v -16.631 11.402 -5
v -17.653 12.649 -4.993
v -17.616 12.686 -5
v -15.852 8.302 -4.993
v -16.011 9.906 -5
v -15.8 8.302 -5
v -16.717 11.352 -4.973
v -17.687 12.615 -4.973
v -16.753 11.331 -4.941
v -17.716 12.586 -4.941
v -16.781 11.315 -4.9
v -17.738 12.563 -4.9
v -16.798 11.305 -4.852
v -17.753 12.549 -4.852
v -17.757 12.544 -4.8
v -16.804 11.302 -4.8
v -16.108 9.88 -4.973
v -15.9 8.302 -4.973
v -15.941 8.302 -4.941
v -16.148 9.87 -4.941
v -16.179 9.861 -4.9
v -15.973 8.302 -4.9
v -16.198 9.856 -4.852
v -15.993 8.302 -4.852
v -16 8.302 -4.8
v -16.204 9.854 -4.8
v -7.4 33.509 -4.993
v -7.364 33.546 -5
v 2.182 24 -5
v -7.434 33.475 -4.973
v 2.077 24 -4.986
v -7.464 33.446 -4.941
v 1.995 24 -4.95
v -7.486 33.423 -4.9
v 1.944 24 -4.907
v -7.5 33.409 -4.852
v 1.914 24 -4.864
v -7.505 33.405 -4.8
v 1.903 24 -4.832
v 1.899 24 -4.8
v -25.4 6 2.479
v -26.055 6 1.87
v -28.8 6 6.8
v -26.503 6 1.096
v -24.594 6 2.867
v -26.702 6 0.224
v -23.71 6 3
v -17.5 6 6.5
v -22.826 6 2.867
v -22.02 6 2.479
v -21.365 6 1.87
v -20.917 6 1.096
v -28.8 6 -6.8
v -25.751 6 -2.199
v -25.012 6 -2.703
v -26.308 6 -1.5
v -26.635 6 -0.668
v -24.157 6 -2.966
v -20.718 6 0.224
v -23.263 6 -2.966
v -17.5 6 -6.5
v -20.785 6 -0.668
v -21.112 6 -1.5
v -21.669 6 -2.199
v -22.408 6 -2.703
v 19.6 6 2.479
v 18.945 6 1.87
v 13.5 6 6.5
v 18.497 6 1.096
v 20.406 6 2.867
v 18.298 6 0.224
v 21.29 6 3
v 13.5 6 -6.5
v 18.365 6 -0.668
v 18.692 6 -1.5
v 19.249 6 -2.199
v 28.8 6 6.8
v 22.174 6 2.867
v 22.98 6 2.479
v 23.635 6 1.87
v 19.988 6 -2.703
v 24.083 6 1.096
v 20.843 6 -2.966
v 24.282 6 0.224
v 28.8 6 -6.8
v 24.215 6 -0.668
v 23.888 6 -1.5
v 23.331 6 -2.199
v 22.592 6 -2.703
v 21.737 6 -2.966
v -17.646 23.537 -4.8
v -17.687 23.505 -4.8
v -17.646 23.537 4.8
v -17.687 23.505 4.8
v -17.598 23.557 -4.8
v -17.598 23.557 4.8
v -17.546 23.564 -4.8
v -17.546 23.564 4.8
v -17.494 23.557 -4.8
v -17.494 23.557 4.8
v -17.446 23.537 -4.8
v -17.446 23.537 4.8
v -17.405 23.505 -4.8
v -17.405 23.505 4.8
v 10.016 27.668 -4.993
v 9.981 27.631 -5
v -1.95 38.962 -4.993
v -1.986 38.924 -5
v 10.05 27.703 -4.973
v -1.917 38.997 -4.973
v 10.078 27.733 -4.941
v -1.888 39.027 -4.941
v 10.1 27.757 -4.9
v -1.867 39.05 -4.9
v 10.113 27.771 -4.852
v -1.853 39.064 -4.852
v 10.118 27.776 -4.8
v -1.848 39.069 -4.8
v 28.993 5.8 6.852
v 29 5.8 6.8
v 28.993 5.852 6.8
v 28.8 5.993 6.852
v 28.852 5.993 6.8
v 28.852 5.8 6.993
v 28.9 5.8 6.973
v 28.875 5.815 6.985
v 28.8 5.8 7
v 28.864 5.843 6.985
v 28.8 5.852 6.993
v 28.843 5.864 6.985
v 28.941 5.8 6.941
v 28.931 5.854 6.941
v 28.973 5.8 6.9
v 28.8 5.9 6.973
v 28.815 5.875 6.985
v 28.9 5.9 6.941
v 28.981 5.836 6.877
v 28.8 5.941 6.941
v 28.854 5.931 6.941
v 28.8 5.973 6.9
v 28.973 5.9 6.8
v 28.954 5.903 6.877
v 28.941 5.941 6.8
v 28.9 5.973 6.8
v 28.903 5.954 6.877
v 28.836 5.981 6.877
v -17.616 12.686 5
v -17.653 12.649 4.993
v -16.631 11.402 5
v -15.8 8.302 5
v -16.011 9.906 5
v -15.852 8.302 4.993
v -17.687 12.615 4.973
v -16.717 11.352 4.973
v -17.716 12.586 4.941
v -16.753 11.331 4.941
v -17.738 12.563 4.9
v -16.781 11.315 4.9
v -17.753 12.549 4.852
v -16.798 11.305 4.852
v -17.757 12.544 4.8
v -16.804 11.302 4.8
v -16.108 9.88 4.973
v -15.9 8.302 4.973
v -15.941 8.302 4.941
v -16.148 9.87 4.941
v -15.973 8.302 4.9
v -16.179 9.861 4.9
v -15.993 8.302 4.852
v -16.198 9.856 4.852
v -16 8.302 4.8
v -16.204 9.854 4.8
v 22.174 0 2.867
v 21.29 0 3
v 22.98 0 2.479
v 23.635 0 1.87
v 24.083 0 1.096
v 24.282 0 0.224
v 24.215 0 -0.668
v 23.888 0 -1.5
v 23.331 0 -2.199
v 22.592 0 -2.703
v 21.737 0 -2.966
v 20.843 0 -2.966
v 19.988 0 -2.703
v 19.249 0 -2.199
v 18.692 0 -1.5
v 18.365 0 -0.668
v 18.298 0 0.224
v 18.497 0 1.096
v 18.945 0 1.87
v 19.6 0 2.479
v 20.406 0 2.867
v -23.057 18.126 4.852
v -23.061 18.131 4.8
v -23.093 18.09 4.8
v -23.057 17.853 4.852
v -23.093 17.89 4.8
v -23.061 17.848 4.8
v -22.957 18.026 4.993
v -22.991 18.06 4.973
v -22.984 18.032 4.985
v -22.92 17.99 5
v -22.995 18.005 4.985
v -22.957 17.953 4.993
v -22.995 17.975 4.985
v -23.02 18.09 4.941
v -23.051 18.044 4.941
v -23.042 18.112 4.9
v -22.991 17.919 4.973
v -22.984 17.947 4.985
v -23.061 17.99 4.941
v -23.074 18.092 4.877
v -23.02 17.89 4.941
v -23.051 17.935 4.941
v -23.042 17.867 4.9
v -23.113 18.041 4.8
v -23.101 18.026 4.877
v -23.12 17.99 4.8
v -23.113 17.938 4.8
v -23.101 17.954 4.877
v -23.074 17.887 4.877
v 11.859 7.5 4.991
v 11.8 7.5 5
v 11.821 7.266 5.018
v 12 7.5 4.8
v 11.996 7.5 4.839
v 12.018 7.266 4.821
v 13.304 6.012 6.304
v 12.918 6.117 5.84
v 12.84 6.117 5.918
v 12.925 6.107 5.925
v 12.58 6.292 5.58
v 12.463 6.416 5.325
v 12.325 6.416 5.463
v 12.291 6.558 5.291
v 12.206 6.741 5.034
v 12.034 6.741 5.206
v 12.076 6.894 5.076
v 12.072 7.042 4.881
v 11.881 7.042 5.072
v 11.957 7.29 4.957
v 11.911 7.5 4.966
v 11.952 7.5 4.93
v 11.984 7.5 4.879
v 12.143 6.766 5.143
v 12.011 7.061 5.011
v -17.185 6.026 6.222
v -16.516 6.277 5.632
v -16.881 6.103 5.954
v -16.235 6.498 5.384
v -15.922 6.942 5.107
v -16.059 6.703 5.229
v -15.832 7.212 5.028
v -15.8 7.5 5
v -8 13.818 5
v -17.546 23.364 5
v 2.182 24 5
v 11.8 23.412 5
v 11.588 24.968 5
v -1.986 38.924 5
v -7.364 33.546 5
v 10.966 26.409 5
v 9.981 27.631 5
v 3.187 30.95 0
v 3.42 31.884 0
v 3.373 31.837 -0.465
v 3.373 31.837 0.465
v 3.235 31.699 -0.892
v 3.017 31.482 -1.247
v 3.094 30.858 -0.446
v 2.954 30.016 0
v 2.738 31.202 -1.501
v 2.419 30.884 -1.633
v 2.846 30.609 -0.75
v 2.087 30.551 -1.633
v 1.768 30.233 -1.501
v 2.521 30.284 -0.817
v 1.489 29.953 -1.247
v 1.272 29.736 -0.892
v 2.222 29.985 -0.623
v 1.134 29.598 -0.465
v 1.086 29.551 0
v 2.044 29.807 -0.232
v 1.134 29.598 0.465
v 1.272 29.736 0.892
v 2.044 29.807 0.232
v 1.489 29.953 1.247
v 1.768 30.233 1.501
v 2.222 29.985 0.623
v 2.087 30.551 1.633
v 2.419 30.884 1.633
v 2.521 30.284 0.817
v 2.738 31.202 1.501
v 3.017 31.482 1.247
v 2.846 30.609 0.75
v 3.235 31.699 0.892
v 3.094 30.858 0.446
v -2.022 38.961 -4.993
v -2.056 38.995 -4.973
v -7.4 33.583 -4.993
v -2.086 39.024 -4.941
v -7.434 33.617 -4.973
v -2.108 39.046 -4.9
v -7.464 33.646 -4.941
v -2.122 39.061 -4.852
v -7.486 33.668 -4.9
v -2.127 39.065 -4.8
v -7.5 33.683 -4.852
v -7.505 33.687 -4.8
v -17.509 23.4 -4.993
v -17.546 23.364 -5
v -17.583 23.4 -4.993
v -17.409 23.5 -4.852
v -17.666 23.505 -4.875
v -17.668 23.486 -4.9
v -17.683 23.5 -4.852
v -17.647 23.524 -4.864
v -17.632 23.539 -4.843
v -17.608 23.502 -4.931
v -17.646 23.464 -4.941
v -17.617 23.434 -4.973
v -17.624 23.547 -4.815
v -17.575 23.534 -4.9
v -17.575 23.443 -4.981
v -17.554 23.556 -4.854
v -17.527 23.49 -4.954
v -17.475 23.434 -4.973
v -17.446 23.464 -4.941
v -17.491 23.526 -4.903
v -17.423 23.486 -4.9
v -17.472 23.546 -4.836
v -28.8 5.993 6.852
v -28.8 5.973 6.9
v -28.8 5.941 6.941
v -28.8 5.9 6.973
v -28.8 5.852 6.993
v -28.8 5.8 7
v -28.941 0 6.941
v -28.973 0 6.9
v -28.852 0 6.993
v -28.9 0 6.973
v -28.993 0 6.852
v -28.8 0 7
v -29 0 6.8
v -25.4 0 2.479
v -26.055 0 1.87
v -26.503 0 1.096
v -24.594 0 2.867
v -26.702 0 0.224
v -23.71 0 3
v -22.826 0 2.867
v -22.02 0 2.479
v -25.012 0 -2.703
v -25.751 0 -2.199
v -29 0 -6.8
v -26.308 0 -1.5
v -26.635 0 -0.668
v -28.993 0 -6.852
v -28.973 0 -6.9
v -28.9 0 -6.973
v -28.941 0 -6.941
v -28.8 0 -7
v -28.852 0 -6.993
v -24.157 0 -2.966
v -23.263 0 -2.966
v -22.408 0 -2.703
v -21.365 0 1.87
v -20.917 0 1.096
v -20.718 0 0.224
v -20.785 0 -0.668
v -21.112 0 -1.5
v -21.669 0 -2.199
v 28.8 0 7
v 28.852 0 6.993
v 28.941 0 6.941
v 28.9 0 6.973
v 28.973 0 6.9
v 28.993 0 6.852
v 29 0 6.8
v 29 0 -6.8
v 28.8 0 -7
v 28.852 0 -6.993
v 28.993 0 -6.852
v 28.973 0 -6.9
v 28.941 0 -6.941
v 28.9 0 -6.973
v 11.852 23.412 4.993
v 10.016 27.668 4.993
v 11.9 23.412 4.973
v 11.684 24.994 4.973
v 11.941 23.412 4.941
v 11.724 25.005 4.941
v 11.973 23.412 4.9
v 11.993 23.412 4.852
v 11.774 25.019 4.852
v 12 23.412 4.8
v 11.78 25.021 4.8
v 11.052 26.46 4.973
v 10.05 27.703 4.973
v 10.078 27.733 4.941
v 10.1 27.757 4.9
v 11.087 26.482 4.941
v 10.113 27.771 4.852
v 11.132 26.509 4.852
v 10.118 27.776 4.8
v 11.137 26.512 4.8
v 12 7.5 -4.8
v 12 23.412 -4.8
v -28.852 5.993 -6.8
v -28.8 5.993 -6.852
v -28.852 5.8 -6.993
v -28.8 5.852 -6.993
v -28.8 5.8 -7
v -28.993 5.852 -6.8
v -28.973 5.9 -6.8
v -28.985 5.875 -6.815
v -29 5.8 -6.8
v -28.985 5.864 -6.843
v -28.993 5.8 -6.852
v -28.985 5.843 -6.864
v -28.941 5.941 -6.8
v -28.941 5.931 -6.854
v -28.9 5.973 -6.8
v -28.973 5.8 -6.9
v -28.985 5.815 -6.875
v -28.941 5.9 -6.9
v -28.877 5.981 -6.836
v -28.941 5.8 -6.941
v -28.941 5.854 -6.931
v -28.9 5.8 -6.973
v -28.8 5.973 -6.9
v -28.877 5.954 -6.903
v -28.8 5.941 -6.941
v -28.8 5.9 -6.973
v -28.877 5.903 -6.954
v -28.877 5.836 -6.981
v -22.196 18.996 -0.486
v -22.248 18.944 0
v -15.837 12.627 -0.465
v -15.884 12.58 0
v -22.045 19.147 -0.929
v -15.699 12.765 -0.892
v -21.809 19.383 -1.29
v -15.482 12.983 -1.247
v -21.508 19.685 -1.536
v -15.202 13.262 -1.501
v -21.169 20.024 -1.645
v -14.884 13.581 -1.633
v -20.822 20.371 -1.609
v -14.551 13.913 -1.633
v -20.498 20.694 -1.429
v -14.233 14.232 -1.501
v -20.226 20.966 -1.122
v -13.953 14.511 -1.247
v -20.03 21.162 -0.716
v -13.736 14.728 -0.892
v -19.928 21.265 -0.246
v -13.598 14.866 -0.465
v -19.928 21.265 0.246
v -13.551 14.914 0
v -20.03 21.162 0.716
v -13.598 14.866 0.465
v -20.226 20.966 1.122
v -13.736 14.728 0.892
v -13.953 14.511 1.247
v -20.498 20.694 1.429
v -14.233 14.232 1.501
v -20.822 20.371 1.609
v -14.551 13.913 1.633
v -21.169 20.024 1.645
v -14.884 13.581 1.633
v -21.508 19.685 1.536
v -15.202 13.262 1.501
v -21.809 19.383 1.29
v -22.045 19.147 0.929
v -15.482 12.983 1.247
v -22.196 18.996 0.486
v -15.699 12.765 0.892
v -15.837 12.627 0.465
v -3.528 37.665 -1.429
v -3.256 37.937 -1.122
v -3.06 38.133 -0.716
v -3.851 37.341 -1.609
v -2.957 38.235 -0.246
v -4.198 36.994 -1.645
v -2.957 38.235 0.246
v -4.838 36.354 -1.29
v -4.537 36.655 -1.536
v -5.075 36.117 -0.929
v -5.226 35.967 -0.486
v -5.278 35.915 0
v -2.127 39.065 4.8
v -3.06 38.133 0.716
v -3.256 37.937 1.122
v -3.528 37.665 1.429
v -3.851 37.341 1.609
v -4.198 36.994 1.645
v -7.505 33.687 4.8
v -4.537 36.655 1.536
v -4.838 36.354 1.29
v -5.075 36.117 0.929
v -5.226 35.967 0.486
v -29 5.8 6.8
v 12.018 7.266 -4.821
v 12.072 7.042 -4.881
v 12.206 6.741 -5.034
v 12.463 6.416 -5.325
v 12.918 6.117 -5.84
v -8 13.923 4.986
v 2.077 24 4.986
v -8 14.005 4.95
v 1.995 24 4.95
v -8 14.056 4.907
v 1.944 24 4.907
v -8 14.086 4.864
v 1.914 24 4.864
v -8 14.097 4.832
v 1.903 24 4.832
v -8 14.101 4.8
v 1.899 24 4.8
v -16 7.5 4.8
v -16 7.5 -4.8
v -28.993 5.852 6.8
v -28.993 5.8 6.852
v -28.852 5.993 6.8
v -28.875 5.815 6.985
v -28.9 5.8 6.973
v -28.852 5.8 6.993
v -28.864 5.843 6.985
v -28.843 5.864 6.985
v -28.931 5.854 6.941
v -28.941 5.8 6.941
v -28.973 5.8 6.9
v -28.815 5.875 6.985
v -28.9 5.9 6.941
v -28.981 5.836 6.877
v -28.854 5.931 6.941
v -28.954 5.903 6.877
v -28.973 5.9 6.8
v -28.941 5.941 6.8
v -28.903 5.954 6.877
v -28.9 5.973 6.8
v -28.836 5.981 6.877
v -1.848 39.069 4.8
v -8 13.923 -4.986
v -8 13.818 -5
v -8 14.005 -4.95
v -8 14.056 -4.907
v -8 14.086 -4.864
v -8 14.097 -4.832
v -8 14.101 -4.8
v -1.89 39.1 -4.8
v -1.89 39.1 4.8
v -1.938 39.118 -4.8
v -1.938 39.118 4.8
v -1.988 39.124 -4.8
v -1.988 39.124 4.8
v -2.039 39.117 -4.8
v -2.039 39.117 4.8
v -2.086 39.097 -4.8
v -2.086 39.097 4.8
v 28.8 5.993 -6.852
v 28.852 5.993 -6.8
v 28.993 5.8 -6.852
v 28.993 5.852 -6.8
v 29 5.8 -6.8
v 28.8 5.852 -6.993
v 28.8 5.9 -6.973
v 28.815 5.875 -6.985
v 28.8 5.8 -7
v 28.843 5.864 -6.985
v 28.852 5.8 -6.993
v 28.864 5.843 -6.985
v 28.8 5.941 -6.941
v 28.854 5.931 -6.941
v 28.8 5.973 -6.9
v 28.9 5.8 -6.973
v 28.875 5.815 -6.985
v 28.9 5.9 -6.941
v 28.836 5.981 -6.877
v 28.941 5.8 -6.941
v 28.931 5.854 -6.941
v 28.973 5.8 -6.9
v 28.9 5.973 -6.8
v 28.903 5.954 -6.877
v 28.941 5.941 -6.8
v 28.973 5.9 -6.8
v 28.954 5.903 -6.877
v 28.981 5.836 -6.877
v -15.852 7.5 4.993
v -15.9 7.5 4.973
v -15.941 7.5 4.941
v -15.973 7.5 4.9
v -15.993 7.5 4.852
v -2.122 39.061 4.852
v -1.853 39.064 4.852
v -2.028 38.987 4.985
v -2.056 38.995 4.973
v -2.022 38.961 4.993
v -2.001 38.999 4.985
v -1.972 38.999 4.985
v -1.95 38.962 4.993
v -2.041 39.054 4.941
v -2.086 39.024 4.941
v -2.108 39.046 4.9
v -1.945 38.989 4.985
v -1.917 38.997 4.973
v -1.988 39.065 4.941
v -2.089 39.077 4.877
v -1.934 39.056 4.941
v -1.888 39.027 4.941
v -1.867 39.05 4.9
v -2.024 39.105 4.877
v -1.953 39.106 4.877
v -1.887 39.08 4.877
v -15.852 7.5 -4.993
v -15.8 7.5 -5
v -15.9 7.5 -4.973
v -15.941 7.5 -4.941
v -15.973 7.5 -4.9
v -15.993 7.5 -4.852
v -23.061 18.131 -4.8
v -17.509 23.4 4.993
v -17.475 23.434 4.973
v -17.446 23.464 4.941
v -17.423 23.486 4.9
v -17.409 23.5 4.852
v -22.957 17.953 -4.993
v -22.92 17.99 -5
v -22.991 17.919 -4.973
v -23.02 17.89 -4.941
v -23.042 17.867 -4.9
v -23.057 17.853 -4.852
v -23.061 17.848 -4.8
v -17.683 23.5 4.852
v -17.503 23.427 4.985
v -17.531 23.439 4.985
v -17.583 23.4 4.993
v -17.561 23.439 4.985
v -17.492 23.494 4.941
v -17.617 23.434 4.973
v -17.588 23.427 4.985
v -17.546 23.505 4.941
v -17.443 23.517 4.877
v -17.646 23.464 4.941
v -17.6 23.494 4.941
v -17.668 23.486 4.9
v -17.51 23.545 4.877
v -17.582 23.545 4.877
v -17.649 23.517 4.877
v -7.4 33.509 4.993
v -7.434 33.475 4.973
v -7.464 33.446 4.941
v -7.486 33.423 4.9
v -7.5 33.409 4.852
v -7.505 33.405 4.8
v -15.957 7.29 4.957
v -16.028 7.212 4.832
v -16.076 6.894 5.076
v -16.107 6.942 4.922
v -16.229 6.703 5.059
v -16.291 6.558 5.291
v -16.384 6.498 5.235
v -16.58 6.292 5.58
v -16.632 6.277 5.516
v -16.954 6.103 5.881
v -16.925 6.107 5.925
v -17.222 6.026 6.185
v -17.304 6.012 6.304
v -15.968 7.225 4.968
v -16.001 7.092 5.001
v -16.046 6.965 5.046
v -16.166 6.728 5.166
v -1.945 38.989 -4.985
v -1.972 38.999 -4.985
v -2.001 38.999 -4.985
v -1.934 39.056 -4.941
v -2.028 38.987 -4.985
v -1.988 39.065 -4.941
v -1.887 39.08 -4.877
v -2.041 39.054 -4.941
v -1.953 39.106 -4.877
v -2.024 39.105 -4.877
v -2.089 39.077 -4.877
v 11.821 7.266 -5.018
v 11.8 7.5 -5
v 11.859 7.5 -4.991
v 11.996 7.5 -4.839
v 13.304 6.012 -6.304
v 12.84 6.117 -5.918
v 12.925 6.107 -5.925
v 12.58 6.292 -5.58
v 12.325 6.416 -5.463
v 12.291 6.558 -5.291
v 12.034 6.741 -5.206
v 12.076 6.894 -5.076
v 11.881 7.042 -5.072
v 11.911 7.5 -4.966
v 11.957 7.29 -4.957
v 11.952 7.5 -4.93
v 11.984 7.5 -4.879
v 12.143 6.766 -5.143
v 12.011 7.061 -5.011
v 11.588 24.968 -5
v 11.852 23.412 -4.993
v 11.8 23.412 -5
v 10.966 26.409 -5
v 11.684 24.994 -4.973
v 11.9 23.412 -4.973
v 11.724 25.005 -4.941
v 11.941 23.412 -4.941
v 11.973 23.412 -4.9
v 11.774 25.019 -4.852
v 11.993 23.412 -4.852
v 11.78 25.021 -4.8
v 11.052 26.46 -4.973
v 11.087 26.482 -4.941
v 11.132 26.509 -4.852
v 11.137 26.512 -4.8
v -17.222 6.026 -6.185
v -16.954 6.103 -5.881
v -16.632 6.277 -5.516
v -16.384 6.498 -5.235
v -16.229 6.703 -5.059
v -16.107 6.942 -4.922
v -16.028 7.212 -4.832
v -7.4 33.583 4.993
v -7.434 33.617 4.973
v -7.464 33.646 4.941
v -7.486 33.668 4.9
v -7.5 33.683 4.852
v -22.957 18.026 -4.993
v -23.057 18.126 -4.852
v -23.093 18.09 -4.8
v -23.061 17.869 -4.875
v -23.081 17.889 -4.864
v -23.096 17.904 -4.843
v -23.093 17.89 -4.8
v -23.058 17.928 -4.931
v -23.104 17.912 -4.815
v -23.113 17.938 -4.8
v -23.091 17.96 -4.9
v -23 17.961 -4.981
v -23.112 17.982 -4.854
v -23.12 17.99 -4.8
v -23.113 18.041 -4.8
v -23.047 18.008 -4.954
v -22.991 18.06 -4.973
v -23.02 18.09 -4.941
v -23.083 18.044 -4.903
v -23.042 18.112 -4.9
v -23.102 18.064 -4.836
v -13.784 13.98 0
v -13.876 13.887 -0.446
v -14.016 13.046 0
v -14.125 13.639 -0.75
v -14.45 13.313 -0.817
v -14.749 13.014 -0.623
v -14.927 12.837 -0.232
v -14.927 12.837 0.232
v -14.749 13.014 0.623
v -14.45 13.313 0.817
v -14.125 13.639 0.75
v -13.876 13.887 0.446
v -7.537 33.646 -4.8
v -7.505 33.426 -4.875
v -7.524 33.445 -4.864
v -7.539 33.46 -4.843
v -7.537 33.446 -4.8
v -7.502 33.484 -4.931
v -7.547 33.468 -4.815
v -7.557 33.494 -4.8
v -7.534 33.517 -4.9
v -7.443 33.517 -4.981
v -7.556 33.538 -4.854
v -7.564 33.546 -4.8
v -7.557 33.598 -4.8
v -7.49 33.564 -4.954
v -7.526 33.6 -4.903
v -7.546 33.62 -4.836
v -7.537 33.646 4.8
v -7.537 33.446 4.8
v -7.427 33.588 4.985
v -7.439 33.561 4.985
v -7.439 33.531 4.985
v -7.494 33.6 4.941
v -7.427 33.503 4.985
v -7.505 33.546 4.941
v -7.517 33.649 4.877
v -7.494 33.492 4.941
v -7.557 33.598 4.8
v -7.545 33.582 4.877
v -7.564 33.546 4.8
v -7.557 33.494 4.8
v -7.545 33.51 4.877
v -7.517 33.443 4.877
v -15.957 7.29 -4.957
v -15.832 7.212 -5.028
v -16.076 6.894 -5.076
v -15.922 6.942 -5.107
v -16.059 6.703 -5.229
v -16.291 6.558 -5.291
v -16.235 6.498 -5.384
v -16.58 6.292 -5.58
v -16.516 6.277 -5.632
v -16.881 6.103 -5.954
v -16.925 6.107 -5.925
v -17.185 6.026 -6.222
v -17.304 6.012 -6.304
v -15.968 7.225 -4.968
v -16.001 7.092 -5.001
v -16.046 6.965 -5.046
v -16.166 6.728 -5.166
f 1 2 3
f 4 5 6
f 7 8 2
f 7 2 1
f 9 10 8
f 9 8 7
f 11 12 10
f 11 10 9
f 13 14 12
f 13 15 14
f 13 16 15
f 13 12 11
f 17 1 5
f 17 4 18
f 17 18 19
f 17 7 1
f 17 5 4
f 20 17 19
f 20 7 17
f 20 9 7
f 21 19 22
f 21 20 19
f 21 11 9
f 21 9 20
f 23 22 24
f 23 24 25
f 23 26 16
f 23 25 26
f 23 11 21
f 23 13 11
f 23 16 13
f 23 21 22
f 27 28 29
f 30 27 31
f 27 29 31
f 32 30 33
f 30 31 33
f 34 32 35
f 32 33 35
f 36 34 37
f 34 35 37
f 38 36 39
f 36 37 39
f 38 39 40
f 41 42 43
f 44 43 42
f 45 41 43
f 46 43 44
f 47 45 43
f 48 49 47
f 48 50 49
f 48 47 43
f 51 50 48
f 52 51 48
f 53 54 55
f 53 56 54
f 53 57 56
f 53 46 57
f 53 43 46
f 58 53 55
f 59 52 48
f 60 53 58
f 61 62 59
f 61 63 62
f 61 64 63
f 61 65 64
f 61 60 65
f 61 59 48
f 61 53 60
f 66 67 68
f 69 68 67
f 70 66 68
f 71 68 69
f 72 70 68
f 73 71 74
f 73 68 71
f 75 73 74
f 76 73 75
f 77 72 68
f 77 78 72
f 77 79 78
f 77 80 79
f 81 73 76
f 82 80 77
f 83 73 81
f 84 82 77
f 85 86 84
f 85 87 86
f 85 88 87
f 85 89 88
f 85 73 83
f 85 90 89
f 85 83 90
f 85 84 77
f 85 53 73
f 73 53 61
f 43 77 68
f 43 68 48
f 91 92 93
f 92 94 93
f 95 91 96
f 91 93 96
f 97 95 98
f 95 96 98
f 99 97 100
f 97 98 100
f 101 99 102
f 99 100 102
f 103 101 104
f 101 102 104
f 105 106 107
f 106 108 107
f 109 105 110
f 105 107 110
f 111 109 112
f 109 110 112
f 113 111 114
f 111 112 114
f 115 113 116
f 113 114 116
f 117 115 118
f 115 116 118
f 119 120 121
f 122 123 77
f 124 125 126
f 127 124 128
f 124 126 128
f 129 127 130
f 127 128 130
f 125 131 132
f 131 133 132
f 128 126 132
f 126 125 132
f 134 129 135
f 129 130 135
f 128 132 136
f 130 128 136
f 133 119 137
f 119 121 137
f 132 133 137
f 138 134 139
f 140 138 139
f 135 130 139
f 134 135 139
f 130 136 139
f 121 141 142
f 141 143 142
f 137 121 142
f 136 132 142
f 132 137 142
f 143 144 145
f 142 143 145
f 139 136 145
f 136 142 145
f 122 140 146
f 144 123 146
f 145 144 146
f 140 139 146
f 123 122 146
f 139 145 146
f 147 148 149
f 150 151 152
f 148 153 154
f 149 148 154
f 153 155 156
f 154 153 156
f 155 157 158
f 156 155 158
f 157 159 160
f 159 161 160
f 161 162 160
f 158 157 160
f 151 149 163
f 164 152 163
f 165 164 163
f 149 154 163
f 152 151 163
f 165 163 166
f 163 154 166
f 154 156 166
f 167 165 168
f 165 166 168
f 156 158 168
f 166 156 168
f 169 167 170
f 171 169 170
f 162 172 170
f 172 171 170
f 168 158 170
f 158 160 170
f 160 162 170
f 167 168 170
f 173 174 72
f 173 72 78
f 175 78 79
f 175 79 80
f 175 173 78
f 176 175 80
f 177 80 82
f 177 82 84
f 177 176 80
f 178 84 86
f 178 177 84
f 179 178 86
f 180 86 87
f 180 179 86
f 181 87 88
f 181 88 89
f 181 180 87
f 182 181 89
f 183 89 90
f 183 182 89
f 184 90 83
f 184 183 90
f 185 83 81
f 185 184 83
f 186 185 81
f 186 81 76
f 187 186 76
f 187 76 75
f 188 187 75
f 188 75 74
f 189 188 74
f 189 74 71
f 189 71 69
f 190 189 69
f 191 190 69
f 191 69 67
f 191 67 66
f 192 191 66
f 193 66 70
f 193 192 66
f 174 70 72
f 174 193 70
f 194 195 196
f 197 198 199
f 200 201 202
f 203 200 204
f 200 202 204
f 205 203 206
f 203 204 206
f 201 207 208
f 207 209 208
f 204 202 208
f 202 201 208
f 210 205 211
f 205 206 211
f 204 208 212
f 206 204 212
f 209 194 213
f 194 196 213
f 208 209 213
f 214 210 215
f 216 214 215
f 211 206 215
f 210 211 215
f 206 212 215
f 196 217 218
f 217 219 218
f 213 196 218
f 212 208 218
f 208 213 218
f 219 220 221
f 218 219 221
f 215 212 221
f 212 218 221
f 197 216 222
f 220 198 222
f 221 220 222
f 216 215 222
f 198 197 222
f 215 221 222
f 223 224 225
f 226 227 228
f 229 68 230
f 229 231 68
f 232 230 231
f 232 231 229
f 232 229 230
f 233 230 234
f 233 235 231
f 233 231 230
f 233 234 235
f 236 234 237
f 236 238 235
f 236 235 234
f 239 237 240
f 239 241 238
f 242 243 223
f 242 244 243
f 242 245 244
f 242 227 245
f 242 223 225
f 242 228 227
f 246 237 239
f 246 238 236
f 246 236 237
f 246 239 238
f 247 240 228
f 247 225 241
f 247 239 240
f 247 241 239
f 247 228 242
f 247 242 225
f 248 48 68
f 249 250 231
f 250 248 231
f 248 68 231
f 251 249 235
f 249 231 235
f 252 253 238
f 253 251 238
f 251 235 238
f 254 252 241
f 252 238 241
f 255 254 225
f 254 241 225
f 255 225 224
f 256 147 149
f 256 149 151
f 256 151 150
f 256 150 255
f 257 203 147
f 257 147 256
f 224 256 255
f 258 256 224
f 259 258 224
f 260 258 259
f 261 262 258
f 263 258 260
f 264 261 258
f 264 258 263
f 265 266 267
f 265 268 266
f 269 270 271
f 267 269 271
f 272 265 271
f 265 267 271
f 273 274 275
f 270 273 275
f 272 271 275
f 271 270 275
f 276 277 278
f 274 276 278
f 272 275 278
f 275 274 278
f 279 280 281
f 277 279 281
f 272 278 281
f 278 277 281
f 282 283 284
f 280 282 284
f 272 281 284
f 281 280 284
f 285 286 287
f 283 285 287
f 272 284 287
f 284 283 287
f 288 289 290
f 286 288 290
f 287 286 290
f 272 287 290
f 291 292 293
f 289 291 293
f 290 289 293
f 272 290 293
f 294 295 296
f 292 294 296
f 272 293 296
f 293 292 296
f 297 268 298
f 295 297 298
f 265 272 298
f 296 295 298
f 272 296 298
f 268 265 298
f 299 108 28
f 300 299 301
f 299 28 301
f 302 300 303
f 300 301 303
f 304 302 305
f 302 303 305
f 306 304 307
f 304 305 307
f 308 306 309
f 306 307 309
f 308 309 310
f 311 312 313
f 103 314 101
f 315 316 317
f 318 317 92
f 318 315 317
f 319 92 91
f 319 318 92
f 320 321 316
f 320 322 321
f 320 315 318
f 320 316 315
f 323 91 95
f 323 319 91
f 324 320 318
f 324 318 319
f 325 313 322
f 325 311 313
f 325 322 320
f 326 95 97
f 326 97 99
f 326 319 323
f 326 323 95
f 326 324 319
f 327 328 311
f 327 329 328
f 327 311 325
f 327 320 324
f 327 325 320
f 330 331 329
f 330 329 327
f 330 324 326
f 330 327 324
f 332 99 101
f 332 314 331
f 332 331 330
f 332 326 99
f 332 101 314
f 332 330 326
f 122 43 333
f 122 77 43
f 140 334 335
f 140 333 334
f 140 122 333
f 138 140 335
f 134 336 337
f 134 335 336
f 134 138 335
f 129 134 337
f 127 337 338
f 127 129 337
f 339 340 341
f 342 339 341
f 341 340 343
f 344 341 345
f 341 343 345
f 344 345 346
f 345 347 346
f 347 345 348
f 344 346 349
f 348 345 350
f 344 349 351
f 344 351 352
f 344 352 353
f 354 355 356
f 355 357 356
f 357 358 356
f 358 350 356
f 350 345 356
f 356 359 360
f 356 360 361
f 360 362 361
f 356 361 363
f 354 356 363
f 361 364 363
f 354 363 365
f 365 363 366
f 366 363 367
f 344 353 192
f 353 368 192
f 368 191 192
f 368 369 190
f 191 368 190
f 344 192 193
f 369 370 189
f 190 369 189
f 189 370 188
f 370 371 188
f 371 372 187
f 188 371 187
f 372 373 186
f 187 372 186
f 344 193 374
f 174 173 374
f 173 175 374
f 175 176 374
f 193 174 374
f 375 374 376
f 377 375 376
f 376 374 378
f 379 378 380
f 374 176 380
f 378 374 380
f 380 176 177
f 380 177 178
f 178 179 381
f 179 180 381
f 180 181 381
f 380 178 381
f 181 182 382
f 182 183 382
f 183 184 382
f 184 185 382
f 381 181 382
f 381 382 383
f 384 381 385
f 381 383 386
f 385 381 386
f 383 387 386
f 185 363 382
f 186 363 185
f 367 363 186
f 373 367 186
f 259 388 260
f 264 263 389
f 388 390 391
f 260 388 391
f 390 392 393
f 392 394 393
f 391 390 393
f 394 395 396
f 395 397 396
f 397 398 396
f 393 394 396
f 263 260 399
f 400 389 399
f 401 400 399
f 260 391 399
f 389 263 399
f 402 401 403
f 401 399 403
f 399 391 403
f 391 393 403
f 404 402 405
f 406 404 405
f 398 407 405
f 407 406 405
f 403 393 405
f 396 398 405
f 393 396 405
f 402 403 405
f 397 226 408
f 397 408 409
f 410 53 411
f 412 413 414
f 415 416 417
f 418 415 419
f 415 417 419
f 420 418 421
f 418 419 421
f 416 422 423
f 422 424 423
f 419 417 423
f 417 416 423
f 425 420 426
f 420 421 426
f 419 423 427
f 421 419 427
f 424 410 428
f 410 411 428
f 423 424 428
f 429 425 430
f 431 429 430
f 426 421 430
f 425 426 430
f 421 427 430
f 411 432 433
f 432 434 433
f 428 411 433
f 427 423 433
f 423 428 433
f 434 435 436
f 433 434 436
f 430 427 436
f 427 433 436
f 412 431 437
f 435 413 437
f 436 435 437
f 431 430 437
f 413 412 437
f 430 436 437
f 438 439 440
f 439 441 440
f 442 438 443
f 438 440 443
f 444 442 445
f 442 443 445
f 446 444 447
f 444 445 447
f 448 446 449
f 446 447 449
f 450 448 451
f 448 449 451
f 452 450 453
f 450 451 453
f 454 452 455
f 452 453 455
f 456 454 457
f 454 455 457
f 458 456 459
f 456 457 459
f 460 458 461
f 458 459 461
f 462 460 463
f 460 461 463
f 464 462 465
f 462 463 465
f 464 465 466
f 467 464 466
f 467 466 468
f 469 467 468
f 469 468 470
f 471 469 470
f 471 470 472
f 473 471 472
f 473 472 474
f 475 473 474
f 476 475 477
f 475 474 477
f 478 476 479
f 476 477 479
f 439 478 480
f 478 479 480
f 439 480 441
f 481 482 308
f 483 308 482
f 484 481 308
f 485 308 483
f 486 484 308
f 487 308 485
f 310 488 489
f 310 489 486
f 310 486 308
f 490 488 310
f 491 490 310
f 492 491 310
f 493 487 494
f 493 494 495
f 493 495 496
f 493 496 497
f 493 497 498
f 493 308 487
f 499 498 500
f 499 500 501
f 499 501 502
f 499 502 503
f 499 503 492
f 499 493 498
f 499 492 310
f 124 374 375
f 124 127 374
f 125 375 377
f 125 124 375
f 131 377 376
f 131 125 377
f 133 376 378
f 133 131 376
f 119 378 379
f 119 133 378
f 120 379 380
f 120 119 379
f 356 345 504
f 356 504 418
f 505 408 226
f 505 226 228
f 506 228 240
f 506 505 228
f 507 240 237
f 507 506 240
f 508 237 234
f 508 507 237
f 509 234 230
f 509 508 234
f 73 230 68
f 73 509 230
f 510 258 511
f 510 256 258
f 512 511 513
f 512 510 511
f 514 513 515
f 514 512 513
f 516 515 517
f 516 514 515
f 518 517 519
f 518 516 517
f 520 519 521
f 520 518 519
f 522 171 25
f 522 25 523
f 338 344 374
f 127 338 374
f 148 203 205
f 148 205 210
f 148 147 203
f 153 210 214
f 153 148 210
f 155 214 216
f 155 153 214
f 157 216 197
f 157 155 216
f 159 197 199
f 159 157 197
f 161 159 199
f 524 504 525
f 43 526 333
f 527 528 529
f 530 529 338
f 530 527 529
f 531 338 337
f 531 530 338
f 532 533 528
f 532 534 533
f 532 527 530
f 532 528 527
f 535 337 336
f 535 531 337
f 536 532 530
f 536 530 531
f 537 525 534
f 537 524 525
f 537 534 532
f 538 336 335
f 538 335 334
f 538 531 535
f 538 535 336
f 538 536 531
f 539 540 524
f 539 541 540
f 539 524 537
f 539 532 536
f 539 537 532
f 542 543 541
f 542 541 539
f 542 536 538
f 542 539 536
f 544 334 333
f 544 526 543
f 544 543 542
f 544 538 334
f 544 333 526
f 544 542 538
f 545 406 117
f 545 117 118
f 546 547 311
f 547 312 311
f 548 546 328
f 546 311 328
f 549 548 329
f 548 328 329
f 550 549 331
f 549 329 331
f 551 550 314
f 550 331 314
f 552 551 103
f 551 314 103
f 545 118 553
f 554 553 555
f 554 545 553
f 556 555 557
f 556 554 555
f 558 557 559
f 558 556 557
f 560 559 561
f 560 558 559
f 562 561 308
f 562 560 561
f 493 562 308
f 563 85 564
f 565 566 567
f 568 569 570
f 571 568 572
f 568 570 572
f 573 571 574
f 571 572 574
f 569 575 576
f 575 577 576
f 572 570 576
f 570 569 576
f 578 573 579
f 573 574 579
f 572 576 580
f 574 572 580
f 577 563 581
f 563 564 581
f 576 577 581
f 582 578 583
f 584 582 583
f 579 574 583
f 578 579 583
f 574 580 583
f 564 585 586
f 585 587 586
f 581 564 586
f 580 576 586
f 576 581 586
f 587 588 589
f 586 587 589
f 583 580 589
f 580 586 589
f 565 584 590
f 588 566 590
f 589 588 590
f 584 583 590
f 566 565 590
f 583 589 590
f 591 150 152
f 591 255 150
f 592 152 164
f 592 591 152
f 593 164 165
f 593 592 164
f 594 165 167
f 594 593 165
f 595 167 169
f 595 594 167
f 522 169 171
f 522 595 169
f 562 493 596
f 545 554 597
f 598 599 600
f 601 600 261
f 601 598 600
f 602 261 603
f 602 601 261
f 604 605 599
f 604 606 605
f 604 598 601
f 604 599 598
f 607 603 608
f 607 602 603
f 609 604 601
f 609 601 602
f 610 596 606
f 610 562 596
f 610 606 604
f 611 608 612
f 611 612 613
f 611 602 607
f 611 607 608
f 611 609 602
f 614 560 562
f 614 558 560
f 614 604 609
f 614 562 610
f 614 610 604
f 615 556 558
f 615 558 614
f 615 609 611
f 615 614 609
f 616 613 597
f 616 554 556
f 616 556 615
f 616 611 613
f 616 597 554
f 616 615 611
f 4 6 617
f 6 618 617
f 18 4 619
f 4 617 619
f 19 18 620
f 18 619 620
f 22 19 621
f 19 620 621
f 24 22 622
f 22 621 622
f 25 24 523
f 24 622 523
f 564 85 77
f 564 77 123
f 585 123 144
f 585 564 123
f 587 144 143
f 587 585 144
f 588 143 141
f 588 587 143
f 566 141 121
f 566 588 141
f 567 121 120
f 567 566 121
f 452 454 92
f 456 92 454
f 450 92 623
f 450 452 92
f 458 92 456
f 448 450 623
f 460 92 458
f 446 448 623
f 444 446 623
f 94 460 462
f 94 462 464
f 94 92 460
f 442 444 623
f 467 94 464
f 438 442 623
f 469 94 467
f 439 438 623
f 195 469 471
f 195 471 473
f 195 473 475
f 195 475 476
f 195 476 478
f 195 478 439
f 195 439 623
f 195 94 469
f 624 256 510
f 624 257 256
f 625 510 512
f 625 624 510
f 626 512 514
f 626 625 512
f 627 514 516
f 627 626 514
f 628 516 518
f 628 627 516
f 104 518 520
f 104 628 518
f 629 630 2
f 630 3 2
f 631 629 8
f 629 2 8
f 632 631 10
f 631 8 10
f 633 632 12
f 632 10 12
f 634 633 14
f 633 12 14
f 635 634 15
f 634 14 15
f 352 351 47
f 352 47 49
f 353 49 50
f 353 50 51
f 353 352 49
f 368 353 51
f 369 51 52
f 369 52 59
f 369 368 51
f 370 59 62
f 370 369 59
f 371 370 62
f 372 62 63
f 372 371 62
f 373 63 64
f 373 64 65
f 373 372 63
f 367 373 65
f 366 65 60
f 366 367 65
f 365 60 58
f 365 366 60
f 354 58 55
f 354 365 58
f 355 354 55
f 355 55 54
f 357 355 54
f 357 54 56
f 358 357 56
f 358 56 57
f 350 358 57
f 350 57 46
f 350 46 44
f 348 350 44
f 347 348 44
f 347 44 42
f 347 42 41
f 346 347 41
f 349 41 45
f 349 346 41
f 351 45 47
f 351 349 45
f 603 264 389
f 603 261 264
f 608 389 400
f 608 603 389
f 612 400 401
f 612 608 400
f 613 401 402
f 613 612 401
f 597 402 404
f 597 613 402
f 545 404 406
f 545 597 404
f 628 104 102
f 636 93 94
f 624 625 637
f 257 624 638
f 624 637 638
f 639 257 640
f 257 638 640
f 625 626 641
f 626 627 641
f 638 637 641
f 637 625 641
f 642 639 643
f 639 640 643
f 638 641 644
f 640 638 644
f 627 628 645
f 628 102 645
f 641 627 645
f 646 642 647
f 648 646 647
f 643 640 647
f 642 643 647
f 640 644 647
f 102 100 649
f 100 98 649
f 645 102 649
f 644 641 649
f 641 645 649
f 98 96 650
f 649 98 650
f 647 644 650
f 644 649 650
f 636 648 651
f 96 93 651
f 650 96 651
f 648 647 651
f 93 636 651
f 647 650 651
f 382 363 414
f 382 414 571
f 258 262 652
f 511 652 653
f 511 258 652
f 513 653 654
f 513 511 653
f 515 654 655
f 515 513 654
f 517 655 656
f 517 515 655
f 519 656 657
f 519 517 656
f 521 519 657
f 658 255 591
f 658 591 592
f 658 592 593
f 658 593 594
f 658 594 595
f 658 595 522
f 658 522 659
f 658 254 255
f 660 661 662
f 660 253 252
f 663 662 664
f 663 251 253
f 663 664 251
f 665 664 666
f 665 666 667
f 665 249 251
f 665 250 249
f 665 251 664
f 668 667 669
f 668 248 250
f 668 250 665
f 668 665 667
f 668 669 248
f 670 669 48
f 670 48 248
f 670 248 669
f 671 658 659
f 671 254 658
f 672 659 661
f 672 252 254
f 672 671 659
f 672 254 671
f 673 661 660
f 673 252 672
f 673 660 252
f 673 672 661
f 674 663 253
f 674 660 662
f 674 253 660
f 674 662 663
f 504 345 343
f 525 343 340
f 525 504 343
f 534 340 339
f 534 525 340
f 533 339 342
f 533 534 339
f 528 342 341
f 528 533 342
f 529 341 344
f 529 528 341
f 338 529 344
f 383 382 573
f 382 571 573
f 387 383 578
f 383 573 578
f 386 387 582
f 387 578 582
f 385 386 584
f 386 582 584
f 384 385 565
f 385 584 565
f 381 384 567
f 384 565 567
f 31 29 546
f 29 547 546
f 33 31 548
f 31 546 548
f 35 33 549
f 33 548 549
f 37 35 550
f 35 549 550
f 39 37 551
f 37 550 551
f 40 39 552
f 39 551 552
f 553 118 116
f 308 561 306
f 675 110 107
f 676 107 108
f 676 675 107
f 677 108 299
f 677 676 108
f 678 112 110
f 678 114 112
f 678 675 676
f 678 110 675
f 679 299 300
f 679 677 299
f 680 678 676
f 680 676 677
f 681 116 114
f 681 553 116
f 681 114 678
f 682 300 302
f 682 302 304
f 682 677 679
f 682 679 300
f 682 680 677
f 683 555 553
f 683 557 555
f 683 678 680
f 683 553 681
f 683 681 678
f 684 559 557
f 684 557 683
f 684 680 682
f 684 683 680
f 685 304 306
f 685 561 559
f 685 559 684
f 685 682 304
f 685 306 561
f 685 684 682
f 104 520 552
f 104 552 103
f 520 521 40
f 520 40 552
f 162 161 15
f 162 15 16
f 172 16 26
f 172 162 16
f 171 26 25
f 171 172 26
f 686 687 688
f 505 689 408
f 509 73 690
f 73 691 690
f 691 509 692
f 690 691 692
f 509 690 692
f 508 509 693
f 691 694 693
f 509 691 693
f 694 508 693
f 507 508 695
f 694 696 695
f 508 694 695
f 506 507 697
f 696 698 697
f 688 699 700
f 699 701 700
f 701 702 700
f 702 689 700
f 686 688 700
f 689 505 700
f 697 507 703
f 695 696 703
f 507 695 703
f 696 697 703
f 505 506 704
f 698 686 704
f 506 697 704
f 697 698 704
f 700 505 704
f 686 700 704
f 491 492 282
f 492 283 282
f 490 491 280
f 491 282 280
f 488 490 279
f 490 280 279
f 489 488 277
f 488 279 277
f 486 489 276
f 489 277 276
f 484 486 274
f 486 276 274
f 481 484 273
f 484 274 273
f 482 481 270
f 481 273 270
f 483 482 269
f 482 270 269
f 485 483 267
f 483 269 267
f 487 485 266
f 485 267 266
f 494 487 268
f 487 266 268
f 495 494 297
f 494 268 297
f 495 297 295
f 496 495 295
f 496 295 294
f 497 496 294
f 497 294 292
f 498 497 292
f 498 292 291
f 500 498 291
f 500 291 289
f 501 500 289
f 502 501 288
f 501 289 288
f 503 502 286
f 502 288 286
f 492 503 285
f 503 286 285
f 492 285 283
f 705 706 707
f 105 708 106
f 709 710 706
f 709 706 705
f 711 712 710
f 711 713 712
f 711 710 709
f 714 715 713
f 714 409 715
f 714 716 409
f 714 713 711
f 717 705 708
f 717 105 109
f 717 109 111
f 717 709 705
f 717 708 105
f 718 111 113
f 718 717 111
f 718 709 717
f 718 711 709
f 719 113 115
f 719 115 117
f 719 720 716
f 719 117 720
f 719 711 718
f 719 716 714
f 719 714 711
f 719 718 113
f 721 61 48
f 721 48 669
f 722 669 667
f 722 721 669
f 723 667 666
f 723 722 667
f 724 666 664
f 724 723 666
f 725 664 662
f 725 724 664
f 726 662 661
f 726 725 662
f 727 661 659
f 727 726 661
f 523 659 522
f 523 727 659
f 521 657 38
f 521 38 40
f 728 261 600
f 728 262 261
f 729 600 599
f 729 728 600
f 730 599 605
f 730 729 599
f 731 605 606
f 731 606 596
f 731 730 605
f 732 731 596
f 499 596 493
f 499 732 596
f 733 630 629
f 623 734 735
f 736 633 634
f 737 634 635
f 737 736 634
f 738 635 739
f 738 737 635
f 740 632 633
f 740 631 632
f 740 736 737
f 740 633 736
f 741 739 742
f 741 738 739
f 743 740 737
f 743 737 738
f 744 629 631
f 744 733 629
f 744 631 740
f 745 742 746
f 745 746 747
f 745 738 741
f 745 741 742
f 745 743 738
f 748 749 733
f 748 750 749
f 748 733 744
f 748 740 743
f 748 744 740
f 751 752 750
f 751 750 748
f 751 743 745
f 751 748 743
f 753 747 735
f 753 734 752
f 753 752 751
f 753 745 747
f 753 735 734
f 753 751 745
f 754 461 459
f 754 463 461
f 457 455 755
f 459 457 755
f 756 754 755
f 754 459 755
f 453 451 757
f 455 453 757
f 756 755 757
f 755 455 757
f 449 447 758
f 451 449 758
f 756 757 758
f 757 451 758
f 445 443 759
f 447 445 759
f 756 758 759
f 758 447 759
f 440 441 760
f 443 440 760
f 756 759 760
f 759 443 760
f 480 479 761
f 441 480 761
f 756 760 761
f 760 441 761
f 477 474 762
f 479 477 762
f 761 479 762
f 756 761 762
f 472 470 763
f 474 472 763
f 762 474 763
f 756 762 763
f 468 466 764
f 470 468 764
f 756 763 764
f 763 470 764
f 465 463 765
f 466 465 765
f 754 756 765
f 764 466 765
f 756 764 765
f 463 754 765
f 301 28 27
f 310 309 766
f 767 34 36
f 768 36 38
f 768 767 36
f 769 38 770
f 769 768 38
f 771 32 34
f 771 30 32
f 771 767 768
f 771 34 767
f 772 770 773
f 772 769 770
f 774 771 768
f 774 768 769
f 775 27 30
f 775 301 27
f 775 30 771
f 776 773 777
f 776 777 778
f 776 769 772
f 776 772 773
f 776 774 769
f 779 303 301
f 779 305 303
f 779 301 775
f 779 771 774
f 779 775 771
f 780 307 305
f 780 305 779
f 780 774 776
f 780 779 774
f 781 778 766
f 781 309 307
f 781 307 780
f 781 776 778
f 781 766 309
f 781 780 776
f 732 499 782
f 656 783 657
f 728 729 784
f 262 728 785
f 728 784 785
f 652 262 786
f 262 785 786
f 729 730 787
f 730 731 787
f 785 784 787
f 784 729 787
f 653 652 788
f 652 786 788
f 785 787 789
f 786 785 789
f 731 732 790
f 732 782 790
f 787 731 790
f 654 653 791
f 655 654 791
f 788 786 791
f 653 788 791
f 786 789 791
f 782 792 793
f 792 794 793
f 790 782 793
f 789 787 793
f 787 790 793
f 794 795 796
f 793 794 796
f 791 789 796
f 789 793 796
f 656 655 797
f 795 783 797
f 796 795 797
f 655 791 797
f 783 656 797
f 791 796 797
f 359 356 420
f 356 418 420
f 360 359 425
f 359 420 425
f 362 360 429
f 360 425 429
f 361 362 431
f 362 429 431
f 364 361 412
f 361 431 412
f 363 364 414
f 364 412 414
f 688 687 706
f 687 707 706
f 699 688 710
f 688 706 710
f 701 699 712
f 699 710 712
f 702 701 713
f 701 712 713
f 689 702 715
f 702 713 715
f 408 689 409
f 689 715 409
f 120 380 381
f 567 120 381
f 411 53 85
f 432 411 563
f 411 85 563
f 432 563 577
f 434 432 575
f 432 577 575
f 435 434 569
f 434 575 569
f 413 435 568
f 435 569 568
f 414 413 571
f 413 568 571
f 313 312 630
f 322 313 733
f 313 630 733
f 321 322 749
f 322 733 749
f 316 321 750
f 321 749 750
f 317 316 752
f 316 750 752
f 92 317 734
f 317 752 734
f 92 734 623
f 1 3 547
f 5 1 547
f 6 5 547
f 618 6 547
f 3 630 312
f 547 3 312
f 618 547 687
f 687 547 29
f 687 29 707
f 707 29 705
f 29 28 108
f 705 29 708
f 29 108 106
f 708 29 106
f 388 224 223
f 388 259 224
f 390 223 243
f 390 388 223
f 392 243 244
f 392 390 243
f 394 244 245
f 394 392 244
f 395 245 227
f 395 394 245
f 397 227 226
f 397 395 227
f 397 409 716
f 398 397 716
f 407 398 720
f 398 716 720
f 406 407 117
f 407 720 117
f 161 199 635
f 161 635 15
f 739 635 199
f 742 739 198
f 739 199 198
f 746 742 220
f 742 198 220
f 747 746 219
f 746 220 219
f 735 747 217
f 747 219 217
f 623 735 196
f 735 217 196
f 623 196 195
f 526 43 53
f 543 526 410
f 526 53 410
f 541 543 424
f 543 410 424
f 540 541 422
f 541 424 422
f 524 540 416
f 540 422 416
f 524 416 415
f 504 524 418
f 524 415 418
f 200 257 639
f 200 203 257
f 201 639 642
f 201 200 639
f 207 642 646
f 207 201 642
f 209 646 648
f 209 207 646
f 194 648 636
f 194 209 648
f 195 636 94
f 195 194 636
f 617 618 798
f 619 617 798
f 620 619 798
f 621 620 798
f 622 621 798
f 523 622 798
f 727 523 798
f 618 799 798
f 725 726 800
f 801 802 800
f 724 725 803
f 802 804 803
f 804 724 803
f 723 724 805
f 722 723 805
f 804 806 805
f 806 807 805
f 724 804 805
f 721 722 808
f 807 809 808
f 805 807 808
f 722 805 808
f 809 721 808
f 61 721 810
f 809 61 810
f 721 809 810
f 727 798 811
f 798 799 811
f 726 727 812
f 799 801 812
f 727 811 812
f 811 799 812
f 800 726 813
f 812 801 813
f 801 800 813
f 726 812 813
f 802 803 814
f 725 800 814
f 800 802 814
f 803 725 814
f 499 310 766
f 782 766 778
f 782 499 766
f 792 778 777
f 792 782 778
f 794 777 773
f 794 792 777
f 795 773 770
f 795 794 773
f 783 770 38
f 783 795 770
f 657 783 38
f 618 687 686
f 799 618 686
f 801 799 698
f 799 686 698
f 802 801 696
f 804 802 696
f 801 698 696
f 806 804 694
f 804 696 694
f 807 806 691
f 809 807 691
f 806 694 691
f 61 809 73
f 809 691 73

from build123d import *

# Parameters (mm, degrees)
SKETCH1_W                 = 58
SKETCH1_H                 = 14
SKETCH1_R                 = 3
BOSS_EXTRUDE1_DEPTH       = 6
BOSS_EXTRUDE2_DEPTH       = 5
M4X0_7_TAPPED_HOLE1_D     = 3.3
M4X0_7_TAPPED_HOLE1_DEPTH = 9
M4X0_7_TAPPED_HOLE1_TIP   = 0.991420021
FILLET1_R                 = 6
FILLET2_R                 = 1.5
FILLET3_R                 = 0.2


with BuildPart() as part:
    # Sketch1 → Boss-Extrude1 (new body)
    with BuildSketch(Plane(origin=(0, 0, 0), x_dir=(1, 0, 0), z_dir=(0, 1, 0))):
        Rectangle(SKETCH1_W, SKETCH1_H)
        with Locations(Location((-23.71, 0, 0), (0, 0, 270))):
            Circle(SKETCH1_R, mode=Mode.SUBTRACT)
        with Locations(Location((21.29, 0, 0), (0, 0, 270))):
            Circle(SKETCH1_R, mode=Mode.SUBTRACT)
    extrude(amount=BOSS_EXTRUDE1_DEPTH)

    # Sketch2 → Boss-Extrude2 (add, symmetric)
    with BuildSketch(Plane.XY):
        with BuildLine():
            Line((12, 26), (-1.98959236, 39.202795796))
            Line((-1.98959236, 39.202795796), (-7.646446609, 33.545941546))
            Line((-7.646446609, 33.545941546), (1.899494937, 24))
            Line((1.899494937, 24), (-8, 14.100505063))
            Line((-8, 14.100505063), (-17.545941546, 23.646446609))
            Line((-17.545941546, 23.646446609), (-23.202795796, 17.98959236))
            Line((-23.202795796, 17.98959236), (-17.757359313, 12.544155877))
            ThreePointArc((-17.757359313, 12.544155877), (-16.456722805, 10.597615784), (-16, 8.30151519))
            Line((-16, 8.30151519), (-16, 6))
            Line((-16, 6), (12, 6))
            Line((12, 6), (12, 26))
        make_face()
    extrude(amount=BOSS_EXTRUDE2_DEPTH, both=True)

    # M4x0.7 Tapped Hole1
    with Locations(Plane(origin=(-20.596194078, 20.596194078, 0), x_dir=(0.7071067811865507, 0.7071067811865445, 0), z_dir=(-0.7071067811865445, 0.7071067811865507, 0))):
        with Locations((-0.686291501, 0), (23.313708499, 0)):
            Hole(M4X0_7_TAPPED_HOLE1_D / 2, depth=M4X0_7_TAPPED_HOLE1_DEPTH)
            with Locations((0, 0, -(M4X0_7_TAPPED_HOLE1_DEPTH + M4X0_7_TAPPED_HOLE1_TIP / 2))):  # 118° drill point
                Cone(0, M4X0_7_TAPPED_HOLE1_D / 2, M4X0_7_TAPPED_HOLE1_TIP, mode=Mode.SUBTRACT)

    # Fillet1
    fillet1_edges = [part.edges().sort_by_distance(p)[0] for p in [
        (12, 26, 0),
    ]]
    fillet(fillet1_edges, radius=FILLET1_R)

    # Fillet2
    fillet2_edges = [part.edges().sort_by_distance(p)[0] for p in [
        (12, 6, 0),
        (-2, 6, -5),
        (-16, 6, 0),
        (-2, 6, 5),
    ]]
    fillet(fillet2_edges, radius=FILLET2_R)

    # Fillet3
    fillet3_edges = [part.edges().sort_by_distance(p)[0] for p in [
        (29, 6, 0),
        (0, 6, -7),
        (-4.818019485, 36.374368671, -5),
        (-1.98959236, 39.202795796, 0),
        (-2.873475836, 28.772970773, -5),
        (-7.646446609, 33.545941546, 0),
        (-3.050252532, 19.050252532, -5),
        (-12.772970773, 18.873475836, -5),
        (-20.374368671, 20.818019485, -5),
        (-17.545941546, 23.646446609, 0),
        (-20.480077554, 15.266874119, -5),
        (-23.202795796, 17.98959236, 0),
        (-16.456722805, 10.597615784, -5),
        (-16, 7.900757595, -5),
        (-4.818019485, 36.374368671, 5),
        (-2.873475836, 28.772970773, 5),
        (-3.050252532, 19.050252532, 5),
        (-12.772970773, 18.873475836, 5),
        (-20.374368671, 20.818019485, 5),
        (-20.480077554, 15.266874119, 5),
        (-16.456722805, 10.597615784, 5),
        (-16, 7.900757595, 5),
        (-29, 6, 0),
        (4.064283192, 33.489399677, -5),
        (4.064283192, 33.489399677, 5),
        (11.509489653, 25.788461743, -5),
        (11.509489653, 25.788461743, 5),
        (12, 15.456215324, -5),
        (12, 15.456215324, 5),
        (-16.530926639, 6.355055975, 5.530926639),
        (12.530926639, 6.355055975, 5.530926639),
        (-16.530926639, 6.355055975, -5.530926639),
        (12.530926639, 6.355055975, -5.530926639),
        (-29, 3, -7),
        (29, 3, -7),
        (29, 3, 7),
        (-29, 3, 7),
        (0, 6, 7),
    ]]
    fillet(fillet3_edges, radius=FILLET3_R)


solid = part.part
